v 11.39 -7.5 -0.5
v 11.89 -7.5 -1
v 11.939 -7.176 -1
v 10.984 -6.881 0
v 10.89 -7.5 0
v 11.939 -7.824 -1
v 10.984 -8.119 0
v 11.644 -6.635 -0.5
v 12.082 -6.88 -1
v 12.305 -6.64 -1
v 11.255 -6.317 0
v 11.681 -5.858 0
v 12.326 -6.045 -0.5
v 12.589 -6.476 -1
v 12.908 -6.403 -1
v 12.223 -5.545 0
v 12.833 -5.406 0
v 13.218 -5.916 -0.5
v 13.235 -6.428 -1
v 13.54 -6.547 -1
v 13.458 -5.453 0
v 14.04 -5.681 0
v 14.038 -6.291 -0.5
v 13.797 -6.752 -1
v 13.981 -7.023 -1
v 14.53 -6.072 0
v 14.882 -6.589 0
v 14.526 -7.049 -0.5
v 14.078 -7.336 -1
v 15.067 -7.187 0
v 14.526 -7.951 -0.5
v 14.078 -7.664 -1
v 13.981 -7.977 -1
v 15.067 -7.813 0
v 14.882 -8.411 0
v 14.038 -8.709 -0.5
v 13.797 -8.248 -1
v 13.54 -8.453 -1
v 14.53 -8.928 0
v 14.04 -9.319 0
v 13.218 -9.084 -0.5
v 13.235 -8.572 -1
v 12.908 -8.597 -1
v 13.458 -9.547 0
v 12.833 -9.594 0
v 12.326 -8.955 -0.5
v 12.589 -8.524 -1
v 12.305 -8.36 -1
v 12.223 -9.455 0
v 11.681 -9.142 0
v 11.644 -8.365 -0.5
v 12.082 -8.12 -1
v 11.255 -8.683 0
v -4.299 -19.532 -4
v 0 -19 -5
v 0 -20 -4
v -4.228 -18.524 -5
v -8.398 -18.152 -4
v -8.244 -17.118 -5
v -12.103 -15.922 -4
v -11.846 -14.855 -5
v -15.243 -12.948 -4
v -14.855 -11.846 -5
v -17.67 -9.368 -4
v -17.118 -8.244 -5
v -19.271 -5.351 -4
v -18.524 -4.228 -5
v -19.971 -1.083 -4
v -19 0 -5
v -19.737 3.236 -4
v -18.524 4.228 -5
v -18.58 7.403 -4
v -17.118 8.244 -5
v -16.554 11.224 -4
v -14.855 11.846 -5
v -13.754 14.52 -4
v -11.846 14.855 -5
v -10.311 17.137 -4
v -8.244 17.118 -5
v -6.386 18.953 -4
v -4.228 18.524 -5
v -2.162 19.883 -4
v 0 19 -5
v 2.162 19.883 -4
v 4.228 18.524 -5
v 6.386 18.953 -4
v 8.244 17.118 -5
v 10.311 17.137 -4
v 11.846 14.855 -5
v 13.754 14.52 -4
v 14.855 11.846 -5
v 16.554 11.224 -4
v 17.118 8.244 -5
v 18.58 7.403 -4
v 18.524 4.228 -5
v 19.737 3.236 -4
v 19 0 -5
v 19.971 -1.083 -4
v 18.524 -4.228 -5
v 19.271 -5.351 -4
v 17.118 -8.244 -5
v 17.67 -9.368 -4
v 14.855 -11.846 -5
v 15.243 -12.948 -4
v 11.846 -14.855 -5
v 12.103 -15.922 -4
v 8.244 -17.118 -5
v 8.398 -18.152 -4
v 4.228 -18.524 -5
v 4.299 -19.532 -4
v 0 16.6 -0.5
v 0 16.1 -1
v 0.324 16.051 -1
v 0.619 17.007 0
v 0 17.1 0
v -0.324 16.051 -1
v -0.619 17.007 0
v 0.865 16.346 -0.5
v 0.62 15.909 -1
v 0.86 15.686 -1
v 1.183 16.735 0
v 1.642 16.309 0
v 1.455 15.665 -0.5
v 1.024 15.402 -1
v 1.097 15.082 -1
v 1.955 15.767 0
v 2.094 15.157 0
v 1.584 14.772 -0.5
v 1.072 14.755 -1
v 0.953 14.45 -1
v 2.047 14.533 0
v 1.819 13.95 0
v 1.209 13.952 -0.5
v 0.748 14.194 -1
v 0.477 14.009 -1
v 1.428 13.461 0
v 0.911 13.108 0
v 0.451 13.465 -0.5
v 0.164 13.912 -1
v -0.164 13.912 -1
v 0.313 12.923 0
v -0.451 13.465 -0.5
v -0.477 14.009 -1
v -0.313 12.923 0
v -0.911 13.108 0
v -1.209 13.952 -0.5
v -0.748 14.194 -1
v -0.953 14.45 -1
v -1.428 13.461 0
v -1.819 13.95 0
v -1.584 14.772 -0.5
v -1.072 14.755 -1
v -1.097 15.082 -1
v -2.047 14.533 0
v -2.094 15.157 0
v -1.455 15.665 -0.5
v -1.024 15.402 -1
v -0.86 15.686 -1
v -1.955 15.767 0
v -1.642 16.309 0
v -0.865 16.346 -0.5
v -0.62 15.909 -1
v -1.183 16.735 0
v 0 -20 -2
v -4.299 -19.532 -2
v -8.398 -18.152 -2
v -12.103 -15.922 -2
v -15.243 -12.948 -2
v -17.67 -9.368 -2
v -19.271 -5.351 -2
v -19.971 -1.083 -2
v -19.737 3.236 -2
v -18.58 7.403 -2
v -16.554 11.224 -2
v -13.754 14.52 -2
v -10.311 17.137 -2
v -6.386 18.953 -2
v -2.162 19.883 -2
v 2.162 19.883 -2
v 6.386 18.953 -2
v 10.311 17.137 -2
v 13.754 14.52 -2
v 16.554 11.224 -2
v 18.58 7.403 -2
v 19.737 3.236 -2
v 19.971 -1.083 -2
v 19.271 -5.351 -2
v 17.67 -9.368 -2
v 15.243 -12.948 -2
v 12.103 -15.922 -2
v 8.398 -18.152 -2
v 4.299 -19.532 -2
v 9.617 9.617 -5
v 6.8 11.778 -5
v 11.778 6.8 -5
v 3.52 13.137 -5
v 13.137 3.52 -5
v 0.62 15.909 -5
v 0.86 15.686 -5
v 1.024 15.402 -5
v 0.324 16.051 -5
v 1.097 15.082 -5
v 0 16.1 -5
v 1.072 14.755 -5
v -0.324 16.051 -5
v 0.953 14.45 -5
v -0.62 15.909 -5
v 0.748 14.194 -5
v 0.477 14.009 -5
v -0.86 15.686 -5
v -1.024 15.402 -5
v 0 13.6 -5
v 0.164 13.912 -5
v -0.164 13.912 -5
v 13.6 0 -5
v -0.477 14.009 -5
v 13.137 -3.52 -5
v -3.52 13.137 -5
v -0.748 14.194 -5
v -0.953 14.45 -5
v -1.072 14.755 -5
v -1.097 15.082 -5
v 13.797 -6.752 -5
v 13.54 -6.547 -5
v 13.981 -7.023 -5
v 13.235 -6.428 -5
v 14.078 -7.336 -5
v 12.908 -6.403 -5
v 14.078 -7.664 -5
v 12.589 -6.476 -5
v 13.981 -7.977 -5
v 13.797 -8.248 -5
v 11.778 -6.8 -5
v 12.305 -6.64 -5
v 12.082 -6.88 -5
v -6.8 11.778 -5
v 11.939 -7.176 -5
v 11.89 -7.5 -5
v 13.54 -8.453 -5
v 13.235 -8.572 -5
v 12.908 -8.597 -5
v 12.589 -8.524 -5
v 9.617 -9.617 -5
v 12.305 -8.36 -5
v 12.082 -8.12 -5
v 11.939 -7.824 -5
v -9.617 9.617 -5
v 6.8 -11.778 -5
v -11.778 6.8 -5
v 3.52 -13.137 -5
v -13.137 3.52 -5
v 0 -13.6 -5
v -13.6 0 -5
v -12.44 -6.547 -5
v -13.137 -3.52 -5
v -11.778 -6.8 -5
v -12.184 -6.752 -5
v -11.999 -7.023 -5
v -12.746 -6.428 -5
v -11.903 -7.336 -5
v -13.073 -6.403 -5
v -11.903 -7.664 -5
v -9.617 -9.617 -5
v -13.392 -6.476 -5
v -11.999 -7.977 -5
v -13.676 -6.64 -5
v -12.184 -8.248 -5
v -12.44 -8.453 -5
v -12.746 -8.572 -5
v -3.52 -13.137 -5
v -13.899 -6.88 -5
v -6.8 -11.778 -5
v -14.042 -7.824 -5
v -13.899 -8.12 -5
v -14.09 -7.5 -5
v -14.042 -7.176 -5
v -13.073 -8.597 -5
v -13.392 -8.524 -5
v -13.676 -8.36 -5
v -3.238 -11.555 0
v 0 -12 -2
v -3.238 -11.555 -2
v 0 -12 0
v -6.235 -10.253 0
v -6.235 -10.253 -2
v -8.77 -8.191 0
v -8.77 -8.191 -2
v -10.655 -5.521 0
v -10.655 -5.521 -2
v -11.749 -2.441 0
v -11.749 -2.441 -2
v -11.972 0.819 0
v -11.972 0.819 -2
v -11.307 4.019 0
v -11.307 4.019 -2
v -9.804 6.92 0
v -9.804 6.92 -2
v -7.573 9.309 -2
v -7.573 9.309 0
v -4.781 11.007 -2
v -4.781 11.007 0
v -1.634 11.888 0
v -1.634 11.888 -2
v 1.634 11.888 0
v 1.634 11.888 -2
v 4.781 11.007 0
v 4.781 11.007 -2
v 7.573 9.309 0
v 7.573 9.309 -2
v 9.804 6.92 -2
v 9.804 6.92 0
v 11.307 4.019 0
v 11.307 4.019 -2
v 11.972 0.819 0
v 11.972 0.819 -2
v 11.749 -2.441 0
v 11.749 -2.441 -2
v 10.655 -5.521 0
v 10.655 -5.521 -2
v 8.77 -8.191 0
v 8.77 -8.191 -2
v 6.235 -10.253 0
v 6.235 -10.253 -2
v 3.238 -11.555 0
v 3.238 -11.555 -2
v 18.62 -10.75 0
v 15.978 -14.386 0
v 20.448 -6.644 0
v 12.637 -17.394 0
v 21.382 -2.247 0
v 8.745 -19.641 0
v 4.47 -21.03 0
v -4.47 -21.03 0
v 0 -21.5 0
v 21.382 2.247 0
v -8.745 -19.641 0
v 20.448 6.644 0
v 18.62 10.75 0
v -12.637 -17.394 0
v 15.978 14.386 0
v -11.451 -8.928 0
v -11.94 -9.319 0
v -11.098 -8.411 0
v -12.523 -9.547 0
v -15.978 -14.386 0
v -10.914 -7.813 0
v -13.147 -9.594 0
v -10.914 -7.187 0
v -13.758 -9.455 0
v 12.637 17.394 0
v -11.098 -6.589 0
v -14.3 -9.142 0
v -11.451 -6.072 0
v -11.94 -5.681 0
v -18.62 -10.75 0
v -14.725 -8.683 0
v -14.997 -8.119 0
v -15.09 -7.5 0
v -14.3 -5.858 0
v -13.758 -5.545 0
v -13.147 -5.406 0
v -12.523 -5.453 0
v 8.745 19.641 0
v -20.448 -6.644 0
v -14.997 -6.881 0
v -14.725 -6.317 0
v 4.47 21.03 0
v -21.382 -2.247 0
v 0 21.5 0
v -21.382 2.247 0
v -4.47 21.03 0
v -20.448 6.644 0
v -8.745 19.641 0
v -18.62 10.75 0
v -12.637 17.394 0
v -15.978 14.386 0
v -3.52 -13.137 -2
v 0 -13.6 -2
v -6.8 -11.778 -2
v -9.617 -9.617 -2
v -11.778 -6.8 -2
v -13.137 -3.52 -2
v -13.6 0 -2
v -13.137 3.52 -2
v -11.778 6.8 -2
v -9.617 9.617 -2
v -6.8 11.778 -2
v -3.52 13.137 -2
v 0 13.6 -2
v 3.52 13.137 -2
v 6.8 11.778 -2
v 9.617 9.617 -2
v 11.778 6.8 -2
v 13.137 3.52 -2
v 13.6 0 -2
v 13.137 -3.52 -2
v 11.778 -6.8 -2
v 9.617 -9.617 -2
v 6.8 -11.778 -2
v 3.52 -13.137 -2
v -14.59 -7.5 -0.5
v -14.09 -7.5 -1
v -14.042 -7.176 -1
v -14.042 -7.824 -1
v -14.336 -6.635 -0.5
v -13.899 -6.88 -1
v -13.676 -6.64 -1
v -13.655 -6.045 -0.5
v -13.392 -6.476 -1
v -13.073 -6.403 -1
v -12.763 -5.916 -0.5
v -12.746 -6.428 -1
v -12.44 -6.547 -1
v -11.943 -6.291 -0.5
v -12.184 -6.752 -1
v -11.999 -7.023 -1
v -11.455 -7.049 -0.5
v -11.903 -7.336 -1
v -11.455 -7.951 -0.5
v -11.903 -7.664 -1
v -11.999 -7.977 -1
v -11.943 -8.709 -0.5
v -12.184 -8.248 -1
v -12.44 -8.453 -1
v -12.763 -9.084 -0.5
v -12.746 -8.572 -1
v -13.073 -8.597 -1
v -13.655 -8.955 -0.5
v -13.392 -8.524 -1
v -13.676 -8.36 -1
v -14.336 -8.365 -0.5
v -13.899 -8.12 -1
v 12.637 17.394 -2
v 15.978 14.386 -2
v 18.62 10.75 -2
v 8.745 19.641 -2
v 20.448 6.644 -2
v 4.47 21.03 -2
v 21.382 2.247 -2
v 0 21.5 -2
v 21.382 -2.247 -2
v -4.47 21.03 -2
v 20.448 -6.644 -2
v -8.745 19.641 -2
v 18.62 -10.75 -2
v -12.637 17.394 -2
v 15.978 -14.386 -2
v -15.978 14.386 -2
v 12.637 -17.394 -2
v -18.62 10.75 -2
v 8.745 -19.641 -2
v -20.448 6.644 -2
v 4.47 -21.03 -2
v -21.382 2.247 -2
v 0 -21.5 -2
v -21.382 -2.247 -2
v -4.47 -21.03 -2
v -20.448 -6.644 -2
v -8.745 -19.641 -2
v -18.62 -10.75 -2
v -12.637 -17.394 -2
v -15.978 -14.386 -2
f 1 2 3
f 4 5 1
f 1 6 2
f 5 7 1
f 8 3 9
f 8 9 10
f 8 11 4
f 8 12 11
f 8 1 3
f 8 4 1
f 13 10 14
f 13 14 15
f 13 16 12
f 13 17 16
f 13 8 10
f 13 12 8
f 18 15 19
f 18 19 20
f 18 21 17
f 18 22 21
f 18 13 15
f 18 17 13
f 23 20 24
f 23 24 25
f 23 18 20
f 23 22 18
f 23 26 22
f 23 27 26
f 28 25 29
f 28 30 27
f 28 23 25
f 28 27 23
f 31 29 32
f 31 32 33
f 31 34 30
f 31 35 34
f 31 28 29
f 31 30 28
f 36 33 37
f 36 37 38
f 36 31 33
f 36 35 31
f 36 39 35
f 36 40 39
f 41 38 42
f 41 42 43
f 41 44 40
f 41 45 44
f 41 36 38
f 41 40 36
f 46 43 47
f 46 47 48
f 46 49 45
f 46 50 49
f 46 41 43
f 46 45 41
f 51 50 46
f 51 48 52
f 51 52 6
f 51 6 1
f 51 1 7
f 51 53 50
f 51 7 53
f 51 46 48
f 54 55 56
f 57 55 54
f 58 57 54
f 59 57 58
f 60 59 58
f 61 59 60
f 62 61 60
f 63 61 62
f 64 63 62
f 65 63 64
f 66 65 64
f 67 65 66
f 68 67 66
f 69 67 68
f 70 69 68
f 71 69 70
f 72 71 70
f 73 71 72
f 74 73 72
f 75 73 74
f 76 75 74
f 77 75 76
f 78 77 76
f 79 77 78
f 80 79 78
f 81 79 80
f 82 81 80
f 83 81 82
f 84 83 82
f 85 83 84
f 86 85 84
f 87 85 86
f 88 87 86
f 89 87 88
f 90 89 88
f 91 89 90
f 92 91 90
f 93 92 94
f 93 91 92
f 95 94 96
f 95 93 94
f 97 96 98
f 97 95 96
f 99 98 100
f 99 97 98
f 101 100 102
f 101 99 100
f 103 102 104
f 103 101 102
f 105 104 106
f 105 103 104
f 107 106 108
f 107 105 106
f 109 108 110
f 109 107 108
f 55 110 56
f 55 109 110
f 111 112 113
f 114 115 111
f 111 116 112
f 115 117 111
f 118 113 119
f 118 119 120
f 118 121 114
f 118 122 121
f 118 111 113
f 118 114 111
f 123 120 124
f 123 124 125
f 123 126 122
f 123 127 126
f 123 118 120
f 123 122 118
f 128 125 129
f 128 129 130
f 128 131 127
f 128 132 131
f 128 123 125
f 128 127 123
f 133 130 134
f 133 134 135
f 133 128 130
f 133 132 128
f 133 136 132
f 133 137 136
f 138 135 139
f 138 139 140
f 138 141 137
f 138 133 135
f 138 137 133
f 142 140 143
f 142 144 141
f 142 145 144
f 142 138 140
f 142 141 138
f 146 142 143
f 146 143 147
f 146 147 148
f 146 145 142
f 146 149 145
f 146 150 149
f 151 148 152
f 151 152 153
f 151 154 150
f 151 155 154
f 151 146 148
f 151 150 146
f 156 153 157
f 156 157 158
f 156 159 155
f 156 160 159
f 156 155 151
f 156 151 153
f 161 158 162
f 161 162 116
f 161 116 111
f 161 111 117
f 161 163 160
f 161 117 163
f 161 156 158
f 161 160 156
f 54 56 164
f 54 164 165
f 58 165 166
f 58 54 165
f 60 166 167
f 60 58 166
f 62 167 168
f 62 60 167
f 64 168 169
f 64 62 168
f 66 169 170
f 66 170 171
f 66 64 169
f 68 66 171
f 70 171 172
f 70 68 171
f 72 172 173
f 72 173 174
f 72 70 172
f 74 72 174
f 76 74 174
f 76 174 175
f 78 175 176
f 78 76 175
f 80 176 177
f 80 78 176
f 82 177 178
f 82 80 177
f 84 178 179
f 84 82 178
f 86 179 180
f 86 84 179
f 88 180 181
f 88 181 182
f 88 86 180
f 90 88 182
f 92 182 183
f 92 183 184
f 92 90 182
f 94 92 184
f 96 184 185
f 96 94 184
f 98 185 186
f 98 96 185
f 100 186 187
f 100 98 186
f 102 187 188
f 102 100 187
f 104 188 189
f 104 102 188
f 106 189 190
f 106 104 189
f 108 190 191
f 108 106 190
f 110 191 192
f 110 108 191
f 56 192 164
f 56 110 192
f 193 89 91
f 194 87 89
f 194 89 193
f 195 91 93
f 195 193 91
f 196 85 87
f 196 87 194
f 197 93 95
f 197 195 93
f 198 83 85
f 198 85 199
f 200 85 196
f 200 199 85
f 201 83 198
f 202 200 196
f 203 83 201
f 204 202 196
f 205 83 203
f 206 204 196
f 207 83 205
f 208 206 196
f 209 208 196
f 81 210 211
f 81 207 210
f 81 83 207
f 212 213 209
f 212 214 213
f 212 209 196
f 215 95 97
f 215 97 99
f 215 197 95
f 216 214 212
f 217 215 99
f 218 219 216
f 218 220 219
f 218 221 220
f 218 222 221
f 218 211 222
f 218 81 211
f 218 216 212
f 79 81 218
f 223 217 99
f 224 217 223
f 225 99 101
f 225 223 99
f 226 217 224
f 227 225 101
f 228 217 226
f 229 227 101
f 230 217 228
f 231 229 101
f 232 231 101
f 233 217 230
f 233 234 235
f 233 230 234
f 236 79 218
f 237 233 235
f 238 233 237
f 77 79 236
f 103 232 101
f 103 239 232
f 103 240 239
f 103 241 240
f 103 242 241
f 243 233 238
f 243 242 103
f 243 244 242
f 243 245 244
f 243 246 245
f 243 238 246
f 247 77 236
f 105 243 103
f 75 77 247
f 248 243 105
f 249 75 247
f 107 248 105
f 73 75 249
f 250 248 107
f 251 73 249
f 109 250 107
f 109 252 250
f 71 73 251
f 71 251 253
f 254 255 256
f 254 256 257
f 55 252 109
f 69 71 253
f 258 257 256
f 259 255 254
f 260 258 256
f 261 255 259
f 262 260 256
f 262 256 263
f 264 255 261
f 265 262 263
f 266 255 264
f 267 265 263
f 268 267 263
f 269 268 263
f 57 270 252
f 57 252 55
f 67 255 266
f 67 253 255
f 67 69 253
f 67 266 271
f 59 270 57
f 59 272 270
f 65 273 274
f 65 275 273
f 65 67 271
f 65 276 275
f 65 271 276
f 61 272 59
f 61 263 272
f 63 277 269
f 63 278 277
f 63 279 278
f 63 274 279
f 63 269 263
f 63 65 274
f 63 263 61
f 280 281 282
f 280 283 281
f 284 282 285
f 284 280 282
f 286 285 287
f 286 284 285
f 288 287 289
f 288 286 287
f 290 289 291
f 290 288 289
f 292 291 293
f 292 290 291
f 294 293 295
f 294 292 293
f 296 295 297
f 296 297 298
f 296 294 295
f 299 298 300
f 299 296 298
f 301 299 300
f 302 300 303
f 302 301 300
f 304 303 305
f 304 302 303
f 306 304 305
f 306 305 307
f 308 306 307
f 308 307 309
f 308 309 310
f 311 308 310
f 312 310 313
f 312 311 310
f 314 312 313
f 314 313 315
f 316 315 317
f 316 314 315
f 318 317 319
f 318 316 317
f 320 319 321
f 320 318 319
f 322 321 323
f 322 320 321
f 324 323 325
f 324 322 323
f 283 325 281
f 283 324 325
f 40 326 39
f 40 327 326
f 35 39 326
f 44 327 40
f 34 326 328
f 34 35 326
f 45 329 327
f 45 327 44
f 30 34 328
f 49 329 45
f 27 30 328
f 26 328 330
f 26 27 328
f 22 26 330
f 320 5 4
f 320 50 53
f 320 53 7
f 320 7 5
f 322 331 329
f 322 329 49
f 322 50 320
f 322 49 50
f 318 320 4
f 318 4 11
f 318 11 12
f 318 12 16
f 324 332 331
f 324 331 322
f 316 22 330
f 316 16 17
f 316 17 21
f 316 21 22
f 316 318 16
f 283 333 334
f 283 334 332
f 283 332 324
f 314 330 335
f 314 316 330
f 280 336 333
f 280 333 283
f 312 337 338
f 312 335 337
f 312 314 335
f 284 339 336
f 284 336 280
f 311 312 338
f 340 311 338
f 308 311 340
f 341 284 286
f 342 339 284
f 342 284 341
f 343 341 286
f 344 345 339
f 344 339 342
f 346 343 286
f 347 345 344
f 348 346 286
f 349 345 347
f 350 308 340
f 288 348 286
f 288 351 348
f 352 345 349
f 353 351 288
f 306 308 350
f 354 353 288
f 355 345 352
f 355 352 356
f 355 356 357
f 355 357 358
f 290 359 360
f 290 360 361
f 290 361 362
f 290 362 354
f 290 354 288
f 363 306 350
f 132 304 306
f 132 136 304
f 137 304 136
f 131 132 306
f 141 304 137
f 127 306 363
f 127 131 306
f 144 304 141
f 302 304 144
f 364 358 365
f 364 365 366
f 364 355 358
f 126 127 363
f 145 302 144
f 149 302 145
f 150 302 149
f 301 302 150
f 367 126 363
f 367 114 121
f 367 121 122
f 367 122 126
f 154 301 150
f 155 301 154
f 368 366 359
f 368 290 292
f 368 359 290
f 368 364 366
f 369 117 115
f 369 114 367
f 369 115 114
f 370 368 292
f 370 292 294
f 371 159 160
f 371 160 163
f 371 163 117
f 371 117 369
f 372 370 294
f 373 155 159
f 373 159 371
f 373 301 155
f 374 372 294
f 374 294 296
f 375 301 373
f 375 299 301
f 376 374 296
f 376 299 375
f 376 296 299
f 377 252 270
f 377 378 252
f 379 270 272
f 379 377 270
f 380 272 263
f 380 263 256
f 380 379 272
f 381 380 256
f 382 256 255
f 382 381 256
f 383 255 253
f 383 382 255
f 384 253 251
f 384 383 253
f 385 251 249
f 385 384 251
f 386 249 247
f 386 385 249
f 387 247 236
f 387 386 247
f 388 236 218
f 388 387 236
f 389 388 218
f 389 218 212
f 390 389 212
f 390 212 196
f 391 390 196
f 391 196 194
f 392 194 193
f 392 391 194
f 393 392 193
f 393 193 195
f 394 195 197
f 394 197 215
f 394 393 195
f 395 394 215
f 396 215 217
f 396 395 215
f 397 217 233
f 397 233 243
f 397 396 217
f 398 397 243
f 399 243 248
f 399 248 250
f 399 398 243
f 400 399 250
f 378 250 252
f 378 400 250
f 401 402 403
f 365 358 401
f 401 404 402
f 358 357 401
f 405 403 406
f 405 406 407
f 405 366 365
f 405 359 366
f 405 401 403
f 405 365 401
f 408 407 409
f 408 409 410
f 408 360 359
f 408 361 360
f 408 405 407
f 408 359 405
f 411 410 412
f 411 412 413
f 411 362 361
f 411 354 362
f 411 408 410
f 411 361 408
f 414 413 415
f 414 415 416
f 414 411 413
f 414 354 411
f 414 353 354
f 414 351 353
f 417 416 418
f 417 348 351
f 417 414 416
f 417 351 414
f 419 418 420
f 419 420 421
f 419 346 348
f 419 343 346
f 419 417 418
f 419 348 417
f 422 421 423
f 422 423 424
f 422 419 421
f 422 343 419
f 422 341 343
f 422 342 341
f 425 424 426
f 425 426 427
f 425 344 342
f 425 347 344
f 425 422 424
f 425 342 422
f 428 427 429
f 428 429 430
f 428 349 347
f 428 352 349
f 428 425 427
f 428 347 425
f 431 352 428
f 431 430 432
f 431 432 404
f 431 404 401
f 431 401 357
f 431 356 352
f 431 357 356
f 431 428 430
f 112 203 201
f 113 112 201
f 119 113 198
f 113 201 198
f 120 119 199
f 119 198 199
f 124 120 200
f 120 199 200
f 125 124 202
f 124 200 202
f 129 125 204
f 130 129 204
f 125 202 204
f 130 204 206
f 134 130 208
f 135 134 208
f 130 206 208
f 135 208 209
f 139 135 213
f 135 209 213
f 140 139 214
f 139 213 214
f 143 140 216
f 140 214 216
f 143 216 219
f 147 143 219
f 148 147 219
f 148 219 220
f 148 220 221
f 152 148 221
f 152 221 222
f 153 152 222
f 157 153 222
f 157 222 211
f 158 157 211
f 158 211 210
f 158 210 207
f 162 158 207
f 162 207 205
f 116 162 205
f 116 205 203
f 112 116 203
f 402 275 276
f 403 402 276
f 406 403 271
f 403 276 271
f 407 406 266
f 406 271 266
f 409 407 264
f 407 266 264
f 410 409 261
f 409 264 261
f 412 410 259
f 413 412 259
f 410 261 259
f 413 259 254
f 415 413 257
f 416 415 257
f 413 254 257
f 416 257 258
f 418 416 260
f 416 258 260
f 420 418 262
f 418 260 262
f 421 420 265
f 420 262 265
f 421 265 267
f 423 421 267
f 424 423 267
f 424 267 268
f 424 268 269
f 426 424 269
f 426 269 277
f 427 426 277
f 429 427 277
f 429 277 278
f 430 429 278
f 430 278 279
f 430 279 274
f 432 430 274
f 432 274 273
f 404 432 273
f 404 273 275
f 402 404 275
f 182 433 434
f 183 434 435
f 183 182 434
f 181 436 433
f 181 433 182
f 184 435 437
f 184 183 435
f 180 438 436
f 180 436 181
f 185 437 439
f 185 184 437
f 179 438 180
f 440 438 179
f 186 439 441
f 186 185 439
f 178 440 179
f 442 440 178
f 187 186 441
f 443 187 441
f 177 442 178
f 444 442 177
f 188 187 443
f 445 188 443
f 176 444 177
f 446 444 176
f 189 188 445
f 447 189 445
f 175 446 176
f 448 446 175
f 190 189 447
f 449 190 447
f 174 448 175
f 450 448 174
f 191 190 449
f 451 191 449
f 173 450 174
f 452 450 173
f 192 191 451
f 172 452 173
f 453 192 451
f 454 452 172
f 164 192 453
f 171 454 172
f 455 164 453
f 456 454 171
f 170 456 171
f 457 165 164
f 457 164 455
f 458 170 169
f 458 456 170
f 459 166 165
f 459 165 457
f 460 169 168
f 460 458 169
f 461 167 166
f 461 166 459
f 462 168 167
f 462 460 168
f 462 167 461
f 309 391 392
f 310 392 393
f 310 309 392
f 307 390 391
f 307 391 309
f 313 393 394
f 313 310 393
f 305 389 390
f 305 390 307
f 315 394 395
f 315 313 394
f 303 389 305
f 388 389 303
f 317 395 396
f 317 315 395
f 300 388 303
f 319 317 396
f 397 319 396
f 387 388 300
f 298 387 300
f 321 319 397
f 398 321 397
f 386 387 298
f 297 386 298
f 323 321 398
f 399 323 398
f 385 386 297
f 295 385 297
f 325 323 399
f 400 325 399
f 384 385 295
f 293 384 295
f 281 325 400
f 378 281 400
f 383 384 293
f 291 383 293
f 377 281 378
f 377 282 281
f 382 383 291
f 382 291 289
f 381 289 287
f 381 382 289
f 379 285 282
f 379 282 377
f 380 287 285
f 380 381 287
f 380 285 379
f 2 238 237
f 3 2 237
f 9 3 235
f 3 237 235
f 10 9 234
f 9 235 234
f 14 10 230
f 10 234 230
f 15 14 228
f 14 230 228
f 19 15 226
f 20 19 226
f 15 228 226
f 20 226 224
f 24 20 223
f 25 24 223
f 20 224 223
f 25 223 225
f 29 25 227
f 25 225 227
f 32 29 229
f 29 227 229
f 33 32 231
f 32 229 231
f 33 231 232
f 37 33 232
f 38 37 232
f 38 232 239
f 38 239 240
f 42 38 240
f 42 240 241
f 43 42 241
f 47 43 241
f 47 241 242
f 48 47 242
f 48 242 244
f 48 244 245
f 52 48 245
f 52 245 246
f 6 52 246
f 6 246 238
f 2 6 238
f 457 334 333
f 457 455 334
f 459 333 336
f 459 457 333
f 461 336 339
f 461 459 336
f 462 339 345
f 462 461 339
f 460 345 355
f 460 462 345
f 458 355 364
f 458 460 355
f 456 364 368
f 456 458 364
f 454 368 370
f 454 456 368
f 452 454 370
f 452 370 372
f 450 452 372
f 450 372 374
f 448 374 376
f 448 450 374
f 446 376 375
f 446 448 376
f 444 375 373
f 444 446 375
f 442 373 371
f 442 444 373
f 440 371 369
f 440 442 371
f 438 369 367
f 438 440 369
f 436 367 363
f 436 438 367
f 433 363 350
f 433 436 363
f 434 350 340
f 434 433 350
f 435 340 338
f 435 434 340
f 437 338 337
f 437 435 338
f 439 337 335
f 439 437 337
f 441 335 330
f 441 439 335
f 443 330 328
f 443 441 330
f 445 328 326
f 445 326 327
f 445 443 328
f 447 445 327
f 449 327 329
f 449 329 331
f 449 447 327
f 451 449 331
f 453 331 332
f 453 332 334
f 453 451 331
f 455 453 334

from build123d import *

# Parameters (mm, degrees)
CHAMFER1_SIZE      = 1
SKETCH2_R          = 1.1
CUT_EXTRUDE1_DEPTH = 31.813957876
CHAMFER2_SIZE      = 1


with BuildPart() as part:
    # Sketch1 → Revolve1 (revolve)
    with BuildSketch(Plane(origin=(0, 0, 0), x_dir=(0, 0, -1), z_dir=(1, 0, 0)), mode=Mode.PRIVATE) as revolve1_sk:
        Polygon((0, 21.5), (2, 21.5), (2, 20), (5, 20), (5, 13.6), (2, 13.6), (2, 12), (0, 12), align=None)
    revolve(revolve1_sk.sketch.rotate(Axis((0, 0, 0), (0, 0, -1)), 180), axis=Axis((0, 0, 0), (0, 0, -1)))

    # Chamfer1
    chamfer1_edges = [part.edges().sort_by_distance(p)[0] for p in [
        (0, 20, -5),
    ]]
    chamfer(chamfer1_edges, length=CHAMFER1_SIZE)

    # Sketch2 → Cut-Extrude1 (cut, through all)
    with BuildSketch(Plane(origin=(0, 0, -5), x_dir=(-1, 0, 0), z_dir=(0, 0, -1))):
        with Locations((12.990381057, -7.5)):
            Circle(SKETCH2_R)
        with Locations((-12.990381057, -7.5)):
            Circle(SKETCH2_R)
        with Locations(Location((0, 15, 0), (0, 0, 90))):
            Circle(SKETCH2_R)
    extrude(amount=-CUT_EXTRUDE1_DEPTH, mode=Mode.SUBTRACT)

    # Chamfer2
    chamfer2_edges = [part.edges().sort_by_distance(p)[0] for p in [
        (-11.890381057, -7.5, 0),
        (14.090381057, -7.5, 0),
        (0, 13.9, 0),
    ]]
    chamfer(chamfer2_edges, length=CHAMFER2_SIZE)


solid = part.part
